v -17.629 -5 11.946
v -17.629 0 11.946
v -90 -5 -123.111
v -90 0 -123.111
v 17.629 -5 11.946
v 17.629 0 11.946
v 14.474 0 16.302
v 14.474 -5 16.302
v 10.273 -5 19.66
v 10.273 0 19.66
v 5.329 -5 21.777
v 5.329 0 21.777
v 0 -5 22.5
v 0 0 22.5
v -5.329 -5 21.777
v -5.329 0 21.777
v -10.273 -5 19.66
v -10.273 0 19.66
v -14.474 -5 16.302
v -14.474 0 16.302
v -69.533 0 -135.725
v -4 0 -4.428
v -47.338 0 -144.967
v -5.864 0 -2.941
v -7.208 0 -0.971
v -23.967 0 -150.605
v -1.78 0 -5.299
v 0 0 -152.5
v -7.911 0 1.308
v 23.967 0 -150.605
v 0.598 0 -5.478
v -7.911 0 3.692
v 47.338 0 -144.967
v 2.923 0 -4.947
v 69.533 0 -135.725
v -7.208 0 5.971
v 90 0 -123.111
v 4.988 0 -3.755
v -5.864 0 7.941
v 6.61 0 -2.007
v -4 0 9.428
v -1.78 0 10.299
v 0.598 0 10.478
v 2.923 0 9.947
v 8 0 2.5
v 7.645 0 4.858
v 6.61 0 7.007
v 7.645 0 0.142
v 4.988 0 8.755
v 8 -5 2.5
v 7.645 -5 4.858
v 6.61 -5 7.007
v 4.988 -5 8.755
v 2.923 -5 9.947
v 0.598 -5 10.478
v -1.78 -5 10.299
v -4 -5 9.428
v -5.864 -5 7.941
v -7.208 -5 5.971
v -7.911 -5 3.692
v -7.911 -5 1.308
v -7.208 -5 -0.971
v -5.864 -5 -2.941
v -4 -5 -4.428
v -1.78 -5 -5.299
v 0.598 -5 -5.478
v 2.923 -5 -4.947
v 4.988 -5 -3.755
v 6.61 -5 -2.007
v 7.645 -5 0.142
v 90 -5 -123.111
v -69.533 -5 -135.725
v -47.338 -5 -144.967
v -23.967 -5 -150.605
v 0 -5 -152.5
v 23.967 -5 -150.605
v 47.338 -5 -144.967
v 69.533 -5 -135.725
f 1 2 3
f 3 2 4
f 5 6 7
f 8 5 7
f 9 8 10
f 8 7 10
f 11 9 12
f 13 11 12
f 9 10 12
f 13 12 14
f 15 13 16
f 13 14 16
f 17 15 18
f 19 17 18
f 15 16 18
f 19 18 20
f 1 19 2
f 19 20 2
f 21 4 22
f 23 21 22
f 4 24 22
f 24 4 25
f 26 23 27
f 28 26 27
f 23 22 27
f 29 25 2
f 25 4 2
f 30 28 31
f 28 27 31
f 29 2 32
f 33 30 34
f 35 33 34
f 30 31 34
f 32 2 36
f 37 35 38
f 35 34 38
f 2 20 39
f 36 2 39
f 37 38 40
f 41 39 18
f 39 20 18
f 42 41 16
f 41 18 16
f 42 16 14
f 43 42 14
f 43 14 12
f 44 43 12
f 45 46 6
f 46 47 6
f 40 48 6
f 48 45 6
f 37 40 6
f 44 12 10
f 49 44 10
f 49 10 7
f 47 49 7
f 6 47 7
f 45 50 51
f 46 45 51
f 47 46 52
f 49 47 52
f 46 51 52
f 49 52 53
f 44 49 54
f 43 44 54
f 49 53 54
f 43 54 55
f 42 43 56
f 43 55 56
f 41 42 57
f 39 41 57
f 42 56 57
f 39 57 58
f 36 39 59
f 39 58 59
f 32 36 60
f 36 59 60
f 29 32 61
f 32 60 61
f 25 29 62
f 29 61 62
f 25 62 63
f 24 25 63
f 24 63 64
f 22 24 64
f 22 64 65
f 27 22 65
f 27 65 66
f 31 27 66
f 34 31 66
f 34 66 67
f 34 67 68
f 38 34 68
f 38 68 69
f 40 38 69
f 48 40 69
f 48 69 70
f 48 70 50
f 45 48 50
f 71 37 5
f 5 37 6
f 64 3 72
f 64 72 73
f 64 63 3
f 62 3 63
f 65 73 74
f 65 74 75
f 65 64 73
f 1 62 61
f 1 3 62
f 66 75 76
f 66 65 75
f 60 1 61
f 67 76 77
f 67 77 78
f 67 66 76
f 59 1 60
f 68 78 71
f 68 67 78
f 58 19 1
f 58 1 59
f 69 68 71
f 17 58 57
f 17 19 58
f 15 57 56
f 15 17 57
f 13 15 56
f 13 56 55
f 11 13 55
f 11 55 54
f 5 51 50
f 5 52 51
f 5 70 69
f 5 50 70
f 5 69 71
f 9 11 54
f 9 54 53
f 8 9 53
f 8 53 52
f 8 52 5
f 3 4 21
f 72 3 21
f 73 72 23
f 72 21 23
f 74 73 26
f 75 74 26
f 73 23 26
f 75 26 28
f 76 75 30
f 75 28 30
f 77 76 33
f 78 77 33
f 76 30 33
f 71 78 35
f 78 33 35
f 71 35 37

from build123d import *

# Parameters (mm, degrees)
F1_DEPTH = 5
F2_R     = 8
F3_DEPTH = 5.001


with BuildPart() as f1:
    # F0 (on Front) → F1 (new body)
    with BuildSketch(Plane.XZ):
        with BuildLine():
            Line((90, -123.110723), (17.628544, 11.946398))
            ThreePointArc((17.628544, 11.946398), (0, 22.5), (-17.628544, 11.946398))
            Line((-17.628544, 11.946398), (-90, -123.110723))
            ThreePointArc((-90, -123.110723), (0, -152.5), (90, -123.110723))
        make_face()
    extrude(amount=F1_DEPTH)

    # F2 (on face) → F3 (cut, through all)
    with BuildSketch(Plane.XZ.offset(5)):
        with Locations((0, 2.5)):
            Circle(F2_R)
    extrude(amount=-F3_DEPTH, mode=Mode.SUBTRACT)


solid = f1.part
